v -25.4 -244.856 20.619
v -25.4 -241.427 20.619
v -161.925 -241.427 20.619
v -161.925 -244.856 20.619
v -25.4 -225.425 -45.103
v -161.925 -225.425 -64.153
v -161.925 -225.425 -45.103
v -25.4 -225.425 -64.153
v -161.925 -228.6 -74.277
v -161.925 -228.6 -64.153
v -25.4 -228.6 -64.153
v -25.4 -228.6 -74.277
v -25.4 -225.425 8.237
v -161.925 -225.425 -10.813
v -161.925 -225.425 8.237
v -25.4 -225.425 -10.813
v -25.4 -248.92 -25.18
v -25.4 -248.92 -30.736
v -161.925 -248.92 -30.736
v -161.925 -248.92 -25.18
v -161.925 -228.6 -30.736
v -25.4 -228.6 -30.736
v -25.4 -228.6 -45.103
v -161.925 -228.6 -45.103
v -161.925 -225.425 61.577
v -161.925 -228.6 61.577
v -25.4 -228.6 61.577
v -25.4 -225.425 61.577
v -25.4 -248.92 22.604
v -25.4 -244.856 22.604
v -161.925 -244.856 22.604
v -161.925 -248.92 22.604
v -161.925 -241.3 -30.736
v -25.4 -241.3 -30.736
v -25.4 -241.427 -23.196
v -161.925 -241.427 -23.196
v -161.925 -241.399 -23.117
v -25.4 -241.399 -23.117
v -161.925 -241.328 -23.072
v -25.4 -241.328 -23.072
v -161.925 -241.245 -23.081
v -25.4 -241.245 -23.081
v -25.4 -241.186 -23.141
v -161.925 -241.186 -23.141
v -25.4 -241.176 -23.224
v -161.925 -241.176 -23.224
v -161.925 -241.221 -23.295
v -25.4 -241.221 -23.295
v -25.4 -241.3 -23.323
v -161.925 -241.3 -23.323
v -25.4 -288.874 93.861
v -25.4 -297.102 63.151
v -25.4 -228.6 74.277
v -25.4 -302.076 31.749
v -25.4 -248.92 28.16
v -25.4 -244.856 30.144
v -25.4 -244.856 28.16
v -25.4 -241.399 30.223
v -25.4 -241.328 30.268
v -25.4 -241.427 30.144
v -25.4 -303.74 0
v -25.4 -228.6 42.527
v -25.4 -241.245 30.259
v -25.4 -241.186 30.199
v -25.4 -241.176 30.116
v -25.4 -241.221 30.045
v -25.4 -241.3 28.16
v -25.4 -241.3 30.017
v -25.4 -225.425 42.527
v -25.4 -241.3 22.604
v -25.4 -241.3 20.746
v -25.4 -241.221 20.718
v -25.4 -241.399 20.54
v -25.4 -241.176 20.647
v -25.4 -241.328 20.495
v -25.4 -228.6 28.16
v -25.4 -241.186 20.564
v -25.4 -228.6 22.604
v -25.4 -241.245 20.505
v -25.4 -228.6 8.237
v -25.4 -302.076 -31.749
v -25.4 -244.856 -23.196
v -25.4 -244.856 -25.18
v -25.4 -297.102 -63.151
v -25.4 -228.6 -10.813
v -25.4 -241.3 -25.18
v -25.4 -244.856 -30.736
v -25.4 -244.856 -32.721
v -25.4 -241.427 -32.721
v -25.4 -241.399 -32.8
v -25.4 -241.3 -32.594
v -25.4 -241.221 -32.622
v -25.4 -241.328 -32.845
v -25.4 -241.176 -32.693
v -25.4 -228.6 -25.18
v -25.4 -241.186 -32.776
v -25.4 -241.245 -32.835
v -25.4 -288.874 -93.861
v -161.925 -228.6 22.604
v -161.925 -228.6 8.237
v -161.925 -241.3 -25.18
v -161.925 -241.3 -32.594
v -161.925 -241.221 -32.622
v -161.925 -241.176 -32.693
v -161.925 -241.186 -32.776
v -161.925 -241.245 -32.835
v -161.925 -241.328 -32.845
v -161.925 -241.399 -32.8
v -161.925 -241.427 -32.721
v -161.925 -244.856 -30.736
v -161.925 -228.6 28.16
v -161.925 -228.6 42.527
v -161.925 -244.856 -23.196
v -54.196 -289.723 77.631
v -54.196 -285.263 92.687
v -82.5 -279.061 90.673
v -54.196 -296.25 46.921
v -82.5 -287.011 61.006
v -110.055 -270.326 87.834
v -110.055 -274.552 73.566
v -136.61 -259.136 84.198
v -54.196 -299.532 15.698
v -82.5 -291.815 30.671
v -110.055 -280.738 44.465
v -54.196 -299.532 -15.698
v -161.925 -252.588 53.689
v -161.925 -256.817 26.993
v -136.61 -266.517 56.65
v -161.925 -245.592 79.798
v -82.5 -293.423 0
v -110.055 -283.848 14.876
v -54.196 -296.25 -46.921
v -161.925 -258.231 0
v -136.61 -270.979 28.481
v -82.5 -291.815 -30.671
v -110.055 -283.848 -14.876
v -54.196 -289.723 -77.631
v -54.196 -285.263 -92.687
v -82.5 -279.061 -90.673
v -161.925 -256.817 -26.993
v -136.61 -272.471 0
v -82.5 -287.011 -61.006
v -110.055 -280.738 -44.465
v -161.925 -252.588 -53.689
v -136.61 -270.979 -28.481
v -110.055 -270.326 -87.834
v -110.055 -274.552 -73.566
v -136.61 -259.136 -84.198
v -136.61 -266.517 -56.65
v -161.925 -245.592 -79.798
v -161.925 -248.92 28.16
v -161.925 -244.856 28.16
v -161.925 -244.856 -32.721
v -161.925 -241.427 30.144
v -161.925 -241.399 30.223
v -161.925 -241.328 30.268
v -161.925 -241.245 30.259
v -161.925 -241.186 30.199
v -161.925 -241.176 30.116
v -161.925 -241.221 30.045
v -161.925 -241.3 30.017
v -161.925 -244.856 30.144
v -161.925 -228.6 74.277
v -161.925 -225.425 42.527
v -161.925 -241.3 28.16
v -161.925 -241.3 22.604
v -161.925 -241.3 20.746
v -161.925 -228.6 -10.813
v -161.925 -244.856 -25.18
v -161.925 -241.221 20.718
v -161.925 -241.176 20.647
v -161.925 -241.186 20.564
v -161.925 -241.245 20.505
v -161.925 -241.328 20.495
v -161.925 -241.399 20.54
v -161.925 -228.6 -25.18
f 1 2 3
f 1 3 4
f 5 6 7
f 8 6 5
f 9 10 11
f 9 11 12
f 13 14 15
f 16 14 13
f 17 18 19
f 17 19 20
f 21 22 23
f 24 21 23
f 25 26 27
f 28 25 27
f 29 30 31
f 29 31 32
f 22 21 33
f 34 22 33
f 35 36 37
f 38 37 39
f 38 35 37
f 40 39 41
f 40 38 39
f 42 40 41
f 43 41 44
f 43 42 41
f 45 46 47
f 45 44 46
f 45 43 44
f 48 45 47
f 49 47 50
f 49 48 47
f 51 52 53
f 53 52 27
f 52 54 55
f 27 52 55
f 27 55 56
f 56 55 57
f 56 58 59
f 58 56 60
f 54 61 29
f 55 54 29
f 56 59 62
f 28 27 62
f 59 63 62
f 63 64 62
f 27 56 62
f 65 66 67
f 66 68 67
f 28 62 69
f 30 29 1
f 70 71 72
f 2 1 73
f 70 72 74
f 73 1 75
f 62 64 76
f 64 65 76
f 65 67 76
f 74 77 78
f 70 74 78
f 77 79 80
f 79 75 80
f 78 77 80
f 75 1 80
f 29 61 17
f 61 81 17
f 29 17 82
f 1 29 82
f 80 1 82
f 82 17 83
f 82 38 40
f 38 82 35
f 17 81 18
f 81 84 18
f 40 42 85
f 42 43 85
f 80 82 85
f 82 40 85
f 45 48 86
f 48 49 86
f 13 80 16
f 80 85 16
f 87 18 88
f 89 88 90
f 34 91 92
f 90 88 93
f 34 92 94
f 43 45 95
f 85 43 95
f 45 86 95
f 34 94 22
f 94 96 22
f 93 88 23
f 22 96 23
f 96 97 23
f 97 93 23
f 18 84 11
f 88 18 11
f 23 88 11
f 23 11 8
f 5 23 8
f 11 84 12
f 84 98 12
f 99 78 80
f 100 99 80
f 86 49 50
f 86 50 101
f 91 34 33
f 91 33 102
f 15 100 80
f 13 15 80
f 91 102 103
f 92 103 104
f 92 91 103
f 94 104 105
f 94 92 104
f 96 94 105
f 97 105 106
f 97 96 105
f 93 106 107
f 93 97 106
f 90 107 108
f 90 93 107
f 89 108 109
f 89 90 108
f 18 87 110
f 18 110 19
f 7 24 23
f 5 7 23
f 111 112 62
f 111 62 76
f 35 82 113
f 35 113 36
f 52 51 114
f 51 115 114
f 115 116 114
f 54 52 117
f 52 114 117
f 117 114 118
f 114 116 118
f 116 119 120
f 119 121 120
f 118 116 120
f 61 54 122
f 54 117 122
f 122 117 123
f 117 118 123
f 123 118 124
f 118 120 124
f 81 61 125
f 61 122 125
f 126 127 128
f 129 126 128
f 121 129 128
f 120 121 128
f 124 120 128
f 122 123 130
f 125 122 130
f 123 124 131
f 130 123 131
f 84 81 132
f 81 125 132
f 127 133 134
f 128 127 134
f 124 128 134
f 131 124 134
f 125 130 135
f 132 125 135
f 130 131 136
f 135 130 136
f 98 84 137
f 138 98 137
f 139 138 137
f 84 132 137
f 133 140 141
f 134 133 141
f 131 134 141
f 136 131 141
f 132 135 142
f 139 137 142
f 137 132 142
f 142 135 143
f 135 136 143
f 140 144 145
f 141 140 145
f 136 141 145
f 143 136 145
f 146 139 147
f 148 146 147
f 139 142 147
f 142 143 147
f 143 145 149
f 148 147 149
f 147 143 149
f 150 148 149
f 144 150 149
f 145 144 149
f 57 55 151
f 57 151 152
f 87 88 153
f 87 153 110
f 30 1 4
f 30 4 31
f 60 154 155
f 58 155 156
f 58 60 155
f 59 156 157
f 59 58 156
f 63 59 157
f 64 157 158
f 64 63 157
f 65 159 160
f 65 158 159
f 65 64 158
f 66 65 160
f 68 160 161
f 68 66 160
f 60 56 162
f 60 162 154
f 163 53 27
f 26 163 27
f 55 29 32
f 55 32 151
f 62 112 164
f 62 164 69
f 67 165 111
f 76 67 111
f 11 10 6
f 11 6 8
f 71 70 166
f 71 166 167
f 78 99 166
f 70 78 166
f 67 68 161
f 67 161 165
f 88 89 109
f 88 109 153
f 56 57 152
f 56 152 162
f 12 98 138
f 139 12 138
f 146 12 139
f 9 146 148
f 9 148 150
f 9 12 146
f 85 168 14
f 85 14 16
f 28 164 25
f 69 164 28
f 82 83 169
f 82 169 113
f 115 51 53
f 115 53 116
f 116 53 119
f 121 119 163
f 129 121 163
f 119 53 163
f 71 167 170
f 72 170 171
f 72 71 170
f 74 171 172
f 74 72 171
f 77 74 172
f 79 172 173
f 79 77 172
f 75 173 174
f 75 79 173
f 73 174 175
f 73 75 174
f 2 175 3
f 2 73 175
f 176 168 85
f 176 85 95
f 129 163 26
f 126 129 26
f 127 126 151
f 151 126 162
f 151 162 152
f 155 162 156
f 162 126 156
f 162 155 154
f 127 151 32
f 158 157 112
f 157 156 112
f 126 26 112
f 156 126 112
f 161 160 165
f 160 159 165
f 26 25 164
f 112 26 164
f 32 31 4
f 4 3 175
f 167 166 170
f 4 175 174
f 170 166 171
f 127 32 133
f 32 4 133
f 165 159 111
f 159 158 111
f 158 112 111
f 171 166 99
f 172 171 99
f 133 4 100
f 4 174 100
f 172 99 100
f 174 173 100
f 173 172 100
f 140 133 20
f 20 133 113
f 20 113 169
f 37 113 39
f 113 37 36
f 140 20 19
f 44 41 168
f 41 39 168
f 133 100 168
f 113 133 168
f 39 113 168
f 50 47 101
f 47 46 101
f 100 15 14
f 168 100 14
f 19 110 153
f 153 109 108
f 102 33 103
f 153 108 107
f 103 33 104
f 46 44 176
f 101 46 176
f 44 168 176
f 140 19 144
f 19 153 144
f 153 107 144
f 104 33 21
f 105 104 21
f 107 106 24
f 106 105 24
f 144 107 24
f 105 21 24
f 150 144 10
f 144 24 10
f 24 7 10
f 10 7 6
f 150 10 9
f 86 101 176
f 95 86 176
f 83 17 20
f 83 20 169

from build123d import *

# Parameters (mm, degrees)
REVOLVE1_ANGLE      = 36
SKETCH2_W           = 185.252199215
SKETCH2_H           = 56.371609172
CUT_EXTRUDE1_DEPTH  = 365.059347887
SKETCH5_W           = 55.655123519
SKETCH5_H           = 148.553285118
CUT_EXTRUDE2_DEPTH  = 235.735844279
SKETCH6_W           = 162.024812579
SKETCH6_H           = 19.05
BOSS_EXTRUDE1_DEPTH = 3.175
LPATTERN1_COUNT     = 3
LPATTERN1_PITCH     = 53.34
CUT_EXTRUDE3_DEPTH  = 357.818950588
LPATTERN2_COUNT     = 2
LPATTERN2_PITCH     = 53.34
SKETCH8_W           = 53.705765401
SKETCH8_H           = 196.003453697
CUT_EXTRUDE4_DEPTH  = 224.765760383


with BuildPart() as part:
    # Sketch1 → Revolve1 (revolve, symmetric)
    with BuildSketch(Plane.XY) as revolve1_sk:
        with BuildLine():
            Line((-202.80204389, -227.539822875), (-25.4, -227.539822875))
            Line((-25.4, -227.539822875), (-25.4, -303.739822875))
            ThreePointArc((-25.4, -303.739822875), (-120.294028152, -280.057827584), (-202.80204389, -227.539822875))
        make_face()
    revolve(axis=Axis((0, 0, 0), (-1, 0, 0)), revolution_arc=REVOLVE1_ANGLE / 2)
    revolve(revolve1_sk.sketch, axis=Axis((0, 0, 0), (1, 0, 0)), revolution_arc=REVOLVE1_ANGLE / 2)

    # Sketch2 → Cut-Extrude1 (cut, through all)
    with BuildSketch(Plane(origin=(-25.4, 0, 0), x_dir=(0, 0, -1), z_dir=(1, 0, 0))):
        with Locations((3.182919918, -200.414195414)):
            Rectangle(SKETCH2_W, SKETCH2_H)
    extrude(amount=-CUT_EXTRUDE1_DEPTH, mode=Mode.SUBTRACT)

    # Sketch5 → Cut-Extrude2 (cut, through all)
    with BuildSketch(Plane(origin=(0, -228.6, 0), x_dir=(1, 0, 0), z_dir=(0, 1, 0))):
        with Locations((-215.252374339, 0)):
            Rectangle(SKETCH5_W, SKETCH5_H)
    extrude(amount=-CUT_EXTRUDE2_DEPTH, mode=Mode.SUBTRACT)

    # Sketch6 → Boss-Extrude1 (add)
    with BuildSketch(Plane(origin=(0, -228.6, 0), x_dir=(1, 0, 0), z_dir=(0, 1, 0))):
        with Locations((-106.41240629, -52.051642559)):
            Rectangle(SKETCH6_W, SKETCH6_H)
    boss_extrude1 = extrude(amount=BOSS_EXTRUDE1_DEPTH)

    # LPattern1: Boss-Extrude1 ×3
    with Locations(*[(0, 0, -i * LPATTERN1_PITCH) for i in range(1, LPATTERN1_COUNT)]):
        add(boss_extrude1)

    # Sketch7 → Cut-Extrude3 (cut, through all)
    with BuildSketch(Plane(origin=(-25.4, 0, 0), x_dir=(0, 0, -1), z_dir=(1, 0, 0))):
        with BuildLine():
            Line((-22.603517559, -244.856), (-22.603517559, -248.92))
            Line((-22.603517559, -248.92), (-28.159767559, -248.92))
            Line((-28.159767559, -248.92), (-28.159767559, -244.856))
            Line((-28.159767559, -244.856), (-30.144142559, -244.856))
            Line((-30.144142559, -244.856), (-30.144142559, -241.427))
            ThreePointArc((-30.144142559, -241.427), (-30.23394512, -241.210197439), (-30.017142559, -241.3))
            Line((-30.017142559, -241.3), (-28.159767559, -241.3))
            Line((-28.159767559, -241.3), (-28.159767559, -228.6))
            Line((-28.159767559, -228.6), (-22.603517559, -228.6))
            Line((-22.603517559, -228.6), (-22.603517559, -241.3))
            Line((-22.603517559, -241.3), (-20.746142559, -241.3))
            ThreePointArc((-20.746142559, -241.3), (-20.529339998, -241.210197439), (-20.619142559, -241.427))
            Line((-20.619142559, -241.427), (-20.619142559, -244.856))
            Line((-20.619142559, -244.856), (-22.603517559, -244.856))
        make_face()
    cut_extrude3 = extrude(amount=-CUT_EXTRUDE3_DEPTH, mode=Mode.SUBTRACT)

    # LPattern2: Cut-Extrude3 ×2
    with Locations(*[(0, 0, -i * LPATTERN2_PITCH) for i in range(1, LPATTERN2_COUNT)]):
        add(cut_extrude3, mode=Mode.SUBTRACT)

    # Sketch8 → Cut-Extrude4 (cut, through all)
    with BuildSketch(Plane(origin=(0, -225.425, 0), x_dir=(1, 0, 0), z_dir=(0, 1, 0))):
        with Locations((-188.777882701, -12.617417505)):
            Rectangle(SKETCH8_W, SKETCH8_H)
    extrude(amount=-CUT_EXTRUDE4_DEPTH, mode=Mode.SUBTRACT)


solid = part.part
